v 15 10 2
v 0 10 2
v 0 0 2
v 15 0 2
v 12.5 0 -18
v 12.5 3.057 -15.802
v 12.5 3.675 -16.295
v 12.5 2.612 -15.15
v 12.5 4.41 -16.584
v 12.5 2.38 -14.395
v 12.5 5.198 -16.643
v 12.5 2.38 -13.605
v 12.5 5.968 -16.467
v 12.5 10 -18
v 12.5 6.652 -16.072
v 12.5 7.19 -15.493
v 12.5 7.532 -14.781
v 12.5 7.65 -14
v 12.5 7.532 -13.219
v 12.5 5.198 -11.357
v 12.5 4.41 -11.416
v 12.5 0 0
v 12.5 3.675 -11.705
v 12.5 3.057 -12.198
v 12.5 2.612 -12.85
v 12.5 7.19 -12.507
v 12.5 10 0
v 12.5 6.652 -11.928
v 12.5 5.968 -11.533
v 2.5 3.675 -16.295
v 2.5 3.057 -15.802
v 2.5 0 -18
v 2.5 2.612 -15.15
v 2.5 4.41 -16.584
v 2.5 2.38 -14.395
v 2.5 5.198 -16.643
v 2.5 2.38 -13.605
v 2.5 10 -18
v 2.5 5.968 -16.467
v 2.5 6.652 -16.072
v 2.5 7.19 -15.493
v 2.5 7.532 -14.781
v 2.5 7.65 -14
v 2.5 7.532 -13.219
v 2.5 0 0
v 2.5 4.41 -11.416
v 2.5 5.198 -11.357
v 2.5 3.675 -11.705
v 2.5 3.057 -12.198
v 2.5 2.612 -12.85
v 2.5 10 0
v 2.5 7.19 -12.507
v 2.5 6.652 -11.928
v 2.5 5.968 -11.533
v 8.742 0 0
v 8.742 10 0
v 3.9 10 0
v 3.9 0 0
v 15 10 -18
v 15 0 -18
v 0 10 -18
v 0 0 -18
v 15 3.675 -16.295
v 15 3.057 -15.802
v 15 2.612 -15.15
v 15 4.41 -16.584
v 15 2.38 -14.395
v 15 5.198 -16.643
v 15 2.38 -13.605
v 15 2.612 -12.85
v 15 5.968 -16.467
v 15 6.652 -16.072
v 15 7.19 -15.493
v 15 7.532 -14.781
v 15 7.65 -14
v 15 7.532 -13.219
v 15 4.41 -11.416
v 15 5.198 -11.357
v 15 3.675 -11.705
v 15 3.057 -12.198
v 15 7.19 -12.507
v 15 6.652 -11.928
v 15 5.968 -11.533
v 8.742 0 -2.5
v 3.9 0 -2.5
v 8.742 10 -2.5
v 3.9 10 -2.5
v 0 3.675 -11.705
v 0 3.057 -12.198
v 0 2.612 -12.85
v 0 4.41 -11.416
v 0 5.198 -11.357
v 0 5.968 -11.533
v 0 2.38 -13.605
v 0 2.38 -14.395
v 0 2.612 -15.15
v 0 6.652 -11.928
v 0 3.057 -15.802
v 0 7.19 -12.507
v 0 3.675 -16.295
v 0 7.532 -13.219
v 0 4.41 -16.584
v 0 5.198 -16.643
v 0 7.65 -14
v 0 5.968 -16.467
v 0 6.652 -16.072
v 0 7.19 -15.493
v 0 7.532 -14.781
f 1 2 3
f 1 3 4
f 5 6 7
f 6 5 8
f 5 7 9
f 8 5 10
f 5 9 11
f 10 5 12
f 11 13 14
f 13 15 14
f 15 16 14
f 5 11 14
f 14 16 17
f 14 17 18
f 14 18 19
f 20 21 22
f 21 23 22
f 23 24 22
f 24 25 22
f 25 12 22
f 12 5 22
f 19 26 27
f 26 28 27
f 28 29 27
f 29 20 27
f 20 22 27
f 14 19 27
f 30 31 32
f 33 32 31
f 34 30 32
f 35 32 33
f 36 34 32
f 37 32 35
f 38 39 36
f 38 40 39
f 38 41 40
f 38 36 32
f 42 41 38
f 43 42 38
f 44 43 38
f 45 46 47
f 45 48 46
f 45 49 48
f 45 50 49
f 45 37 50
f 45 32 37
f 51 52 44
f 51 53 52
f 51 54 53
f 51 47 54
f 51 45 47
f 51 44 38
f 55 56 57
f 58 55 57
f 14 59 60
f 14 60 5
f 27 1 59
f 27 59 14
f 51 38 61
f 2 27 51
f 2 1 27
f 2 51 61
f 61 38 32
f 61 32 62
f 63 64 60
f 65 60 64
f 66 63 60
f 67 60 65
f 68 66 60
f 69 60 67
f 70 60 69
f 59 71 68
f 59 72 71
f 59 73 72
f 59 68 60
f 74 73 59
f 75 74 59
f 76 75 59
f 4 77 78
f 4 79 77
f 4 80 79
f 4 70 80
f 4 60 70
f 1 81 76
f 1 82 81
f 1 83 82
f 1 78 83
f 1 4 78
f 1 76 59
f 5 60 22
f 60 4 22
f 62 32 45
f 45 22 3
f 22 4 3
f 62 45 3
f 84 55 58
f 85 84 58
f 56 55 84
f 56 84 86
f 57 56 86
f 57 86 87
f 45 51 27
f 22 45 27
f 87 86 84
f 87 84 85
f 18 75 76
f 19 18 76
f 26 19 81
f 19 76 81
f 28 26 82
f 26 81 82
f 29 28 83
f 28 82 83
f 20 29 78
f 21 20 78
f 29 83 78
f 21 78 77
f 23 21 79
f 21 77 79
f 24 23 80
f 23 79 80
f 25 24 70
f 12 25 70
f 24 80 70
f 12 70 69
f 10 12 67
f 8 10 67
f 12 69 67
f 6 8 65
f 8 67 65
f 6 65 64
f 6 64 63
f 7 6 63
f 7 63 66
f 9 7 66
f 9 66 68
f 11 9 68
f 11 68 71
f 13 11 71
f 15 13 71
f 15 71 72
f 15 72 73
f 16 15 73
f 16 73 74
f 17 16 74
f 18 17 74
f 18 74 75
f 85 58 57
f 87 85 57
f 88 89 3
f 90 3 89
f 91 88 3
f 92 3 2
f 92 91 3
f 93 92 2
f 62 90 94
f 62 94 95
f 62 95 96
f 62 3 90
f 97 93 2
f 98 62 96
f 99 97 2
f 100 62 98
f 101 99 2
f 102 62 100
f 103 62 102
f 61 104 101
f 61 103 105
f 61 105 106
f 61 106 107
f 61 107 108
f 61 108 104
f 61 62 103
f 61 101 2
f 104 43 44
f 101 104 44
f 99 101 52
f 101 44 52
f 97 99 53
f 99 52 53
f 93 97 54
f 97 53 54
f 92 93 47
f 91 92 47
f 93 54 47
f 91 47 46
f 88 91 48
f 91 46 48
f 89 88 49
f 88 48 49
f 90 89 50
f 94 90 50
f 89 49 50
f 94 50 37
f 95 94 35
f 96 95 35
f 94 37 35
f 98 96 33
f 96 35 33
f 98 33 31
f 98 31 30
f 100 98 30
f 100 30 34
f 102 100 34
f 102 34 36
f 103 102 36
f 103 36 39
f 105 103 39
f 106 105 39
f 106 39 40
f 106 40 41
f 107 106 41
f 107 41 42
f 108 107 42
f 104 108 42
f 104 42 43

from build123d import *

# Parameters (mm, degrees)
SKETCH1_W           = 15
SKETCH1_H           = 10
BOSS_EXTRUDE1_DEPTH = 2
SKETCH2_W           = 2.5
SKETCH2_H           = 10
BOSS_EXTRUDE2_DEPTH = 18
SKETCH3_R           = 2.65
CUT_EXTRUDE1_DEPTH  = 26.475478406
SKETCH4_W           = 4.841644851
SKETCH4_H           = 10
BOSS_EXTRUDE3_DEPTH = 2.5


with BuildPart() as part:
    # Sketch1 → Boss-Extrude1 (new body)
    with BuildSketch(Plane.XY):
        with Locations((7.5, 5)):
            Rectangle(SKETCH1_W, SKETCH1_H)
    extrude(amount=BOSS_EXTRUDE1_DEPTH)

    # Sketch2 → Boss-Extrude2 (add)
    with BuildSketch(Plane(origin=(0, 0, 0), x_dir=(-1, 0, 0), z_dir=(0, 0, -1))):
        with Locations((-13.75, 5)):
            Rectangle(SKETCH2_W, SKETCH2_H)
        with Locations((-1.25, 5)):
            Rectangle(SKETCH2_W, SKETCH2_H)
    extrude(amount=BOSS_EXTRUDE2_DEPTH)

    # Sketch3 → Cut-Extrude1 (cut, through all)
    with BuildSketch(Plane(origin=(15, 0, 0), x_dir=(0, 0, -1), z_dir=(1, 0, 0))):
        with Locations(Location((14, 5, 0), (0, 0, 90))):
            Circle(SKETCH3_R)
    extrude(amount=-CUT_EXTRUDE1_DEPTH, mode=Mode.SUBTRACT)


with BuildPart() as body_2:
    # Sketch4 → Boss-Extrude3 (new body)
    with BuildSketch(Plane(origin=(0, 0, 0), x_dir=(-1, 0, 0), z_dir=(0, 0, -1))):
        with Locations((-6.320822426, 5)):
            Rectangle(SKETCH4_W, SKETCH4_H)
    extrude(amount=BOSS_EXTRUDE3_DEPTH)


solid = Compound([part.part, body_2.part])
